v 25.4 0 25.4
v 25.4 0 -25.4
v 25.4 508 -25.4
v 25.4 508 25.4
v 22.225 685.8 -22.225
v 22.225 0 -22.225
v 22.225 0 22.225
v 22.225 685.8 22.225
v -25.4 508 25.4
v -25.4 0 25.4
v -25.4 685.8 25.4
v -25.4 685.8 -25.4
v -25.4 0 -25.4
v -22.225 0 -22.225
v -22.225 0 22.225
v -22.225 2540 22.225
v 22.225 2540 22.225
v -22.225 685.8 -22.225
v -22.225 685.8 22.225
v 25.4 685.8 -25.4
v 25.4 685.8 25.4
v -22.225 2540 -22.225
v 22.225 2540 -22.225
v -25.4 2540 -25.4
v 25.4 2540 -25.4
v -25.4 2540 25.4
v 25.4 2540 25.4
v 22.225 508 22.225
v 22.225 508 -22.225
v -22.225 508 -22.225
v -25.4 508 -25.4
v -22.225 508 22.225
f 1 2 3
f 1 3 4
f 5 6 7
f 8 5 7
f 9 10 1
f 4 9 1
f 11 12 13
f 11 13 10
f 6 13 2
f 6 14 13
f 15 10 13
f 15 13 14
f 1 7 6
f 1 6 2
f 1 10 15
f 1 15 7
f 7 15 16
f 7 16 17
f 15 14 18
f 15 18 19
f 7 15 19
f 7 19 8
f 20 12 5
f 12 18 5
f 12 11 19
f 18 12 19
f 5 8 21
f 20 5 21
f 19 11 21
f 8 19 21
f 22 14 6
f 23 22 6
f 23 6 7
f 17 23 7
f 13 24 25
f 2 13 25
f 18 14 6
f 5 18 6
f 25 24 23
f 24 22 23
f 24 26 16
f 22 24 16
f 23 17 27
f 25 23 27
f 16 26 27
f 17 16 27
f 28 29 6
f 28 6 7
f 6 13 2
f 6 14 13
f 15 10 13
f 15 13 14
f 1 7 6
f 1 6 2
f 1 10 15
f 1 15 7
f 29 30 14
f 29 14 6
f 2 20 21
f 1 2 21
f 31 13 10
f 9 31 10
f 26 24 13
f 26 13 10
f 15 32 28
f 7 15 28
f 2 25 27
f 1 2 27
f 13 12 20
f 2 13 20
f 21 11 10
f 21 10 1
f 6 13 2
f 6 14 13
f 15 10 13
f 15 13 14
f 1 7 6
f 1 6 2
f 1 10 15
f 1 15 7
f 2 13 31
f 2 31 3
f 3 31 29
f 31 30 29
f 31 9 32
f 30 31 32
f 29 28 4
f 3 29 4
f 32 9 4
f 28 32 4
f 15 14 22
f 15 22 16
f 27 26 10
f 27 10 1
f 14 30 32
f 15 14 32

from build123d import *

# Parameters (mm, degrees)
F0_W     = 50.8
F0_H     = 50.8
F0_W_2   = 44.45
F0_H_2   = 44.45
F1_DEPTH = 2540
F2_DEPTH = 685.8
F3_DEPTH = 508


with BuildPart() as f1:
    # F0 (on Front) → F1 (new body)
    with BuildSketch(Plane.XZ):
        Rectangle(F0_W, F0_H)
        Rectangle(F0_W_2, F0_H_2, mode=Mode.SUBTRACT)
    extrude(amount=-F1_DEPTH)


with BuildPart() as f2:
    # F0 (on Front) → F2 (new body)
    with BuildSketch(Plane.XZ):
        Rectangle(F0_W, F0_H)
        Rectangle(F0_W_2, F0_H_2, mode=Mode.SUBTRACT)
    extrude(amount=-F2_DEPTH)


with BuildPart() as f3:
    # F0 (on Front) → F3 (new body)
    with BuildSketch(Plane.XZ):
        Rectangle(F0_W, F0_H)
        Rectangle(F0_W_2, F0_H_2, mode=Mode.SUBTRACT)
    extrude(amount=-F3_DEPTH)


solid = Compound([f1.part, f2.part, f3.part])
